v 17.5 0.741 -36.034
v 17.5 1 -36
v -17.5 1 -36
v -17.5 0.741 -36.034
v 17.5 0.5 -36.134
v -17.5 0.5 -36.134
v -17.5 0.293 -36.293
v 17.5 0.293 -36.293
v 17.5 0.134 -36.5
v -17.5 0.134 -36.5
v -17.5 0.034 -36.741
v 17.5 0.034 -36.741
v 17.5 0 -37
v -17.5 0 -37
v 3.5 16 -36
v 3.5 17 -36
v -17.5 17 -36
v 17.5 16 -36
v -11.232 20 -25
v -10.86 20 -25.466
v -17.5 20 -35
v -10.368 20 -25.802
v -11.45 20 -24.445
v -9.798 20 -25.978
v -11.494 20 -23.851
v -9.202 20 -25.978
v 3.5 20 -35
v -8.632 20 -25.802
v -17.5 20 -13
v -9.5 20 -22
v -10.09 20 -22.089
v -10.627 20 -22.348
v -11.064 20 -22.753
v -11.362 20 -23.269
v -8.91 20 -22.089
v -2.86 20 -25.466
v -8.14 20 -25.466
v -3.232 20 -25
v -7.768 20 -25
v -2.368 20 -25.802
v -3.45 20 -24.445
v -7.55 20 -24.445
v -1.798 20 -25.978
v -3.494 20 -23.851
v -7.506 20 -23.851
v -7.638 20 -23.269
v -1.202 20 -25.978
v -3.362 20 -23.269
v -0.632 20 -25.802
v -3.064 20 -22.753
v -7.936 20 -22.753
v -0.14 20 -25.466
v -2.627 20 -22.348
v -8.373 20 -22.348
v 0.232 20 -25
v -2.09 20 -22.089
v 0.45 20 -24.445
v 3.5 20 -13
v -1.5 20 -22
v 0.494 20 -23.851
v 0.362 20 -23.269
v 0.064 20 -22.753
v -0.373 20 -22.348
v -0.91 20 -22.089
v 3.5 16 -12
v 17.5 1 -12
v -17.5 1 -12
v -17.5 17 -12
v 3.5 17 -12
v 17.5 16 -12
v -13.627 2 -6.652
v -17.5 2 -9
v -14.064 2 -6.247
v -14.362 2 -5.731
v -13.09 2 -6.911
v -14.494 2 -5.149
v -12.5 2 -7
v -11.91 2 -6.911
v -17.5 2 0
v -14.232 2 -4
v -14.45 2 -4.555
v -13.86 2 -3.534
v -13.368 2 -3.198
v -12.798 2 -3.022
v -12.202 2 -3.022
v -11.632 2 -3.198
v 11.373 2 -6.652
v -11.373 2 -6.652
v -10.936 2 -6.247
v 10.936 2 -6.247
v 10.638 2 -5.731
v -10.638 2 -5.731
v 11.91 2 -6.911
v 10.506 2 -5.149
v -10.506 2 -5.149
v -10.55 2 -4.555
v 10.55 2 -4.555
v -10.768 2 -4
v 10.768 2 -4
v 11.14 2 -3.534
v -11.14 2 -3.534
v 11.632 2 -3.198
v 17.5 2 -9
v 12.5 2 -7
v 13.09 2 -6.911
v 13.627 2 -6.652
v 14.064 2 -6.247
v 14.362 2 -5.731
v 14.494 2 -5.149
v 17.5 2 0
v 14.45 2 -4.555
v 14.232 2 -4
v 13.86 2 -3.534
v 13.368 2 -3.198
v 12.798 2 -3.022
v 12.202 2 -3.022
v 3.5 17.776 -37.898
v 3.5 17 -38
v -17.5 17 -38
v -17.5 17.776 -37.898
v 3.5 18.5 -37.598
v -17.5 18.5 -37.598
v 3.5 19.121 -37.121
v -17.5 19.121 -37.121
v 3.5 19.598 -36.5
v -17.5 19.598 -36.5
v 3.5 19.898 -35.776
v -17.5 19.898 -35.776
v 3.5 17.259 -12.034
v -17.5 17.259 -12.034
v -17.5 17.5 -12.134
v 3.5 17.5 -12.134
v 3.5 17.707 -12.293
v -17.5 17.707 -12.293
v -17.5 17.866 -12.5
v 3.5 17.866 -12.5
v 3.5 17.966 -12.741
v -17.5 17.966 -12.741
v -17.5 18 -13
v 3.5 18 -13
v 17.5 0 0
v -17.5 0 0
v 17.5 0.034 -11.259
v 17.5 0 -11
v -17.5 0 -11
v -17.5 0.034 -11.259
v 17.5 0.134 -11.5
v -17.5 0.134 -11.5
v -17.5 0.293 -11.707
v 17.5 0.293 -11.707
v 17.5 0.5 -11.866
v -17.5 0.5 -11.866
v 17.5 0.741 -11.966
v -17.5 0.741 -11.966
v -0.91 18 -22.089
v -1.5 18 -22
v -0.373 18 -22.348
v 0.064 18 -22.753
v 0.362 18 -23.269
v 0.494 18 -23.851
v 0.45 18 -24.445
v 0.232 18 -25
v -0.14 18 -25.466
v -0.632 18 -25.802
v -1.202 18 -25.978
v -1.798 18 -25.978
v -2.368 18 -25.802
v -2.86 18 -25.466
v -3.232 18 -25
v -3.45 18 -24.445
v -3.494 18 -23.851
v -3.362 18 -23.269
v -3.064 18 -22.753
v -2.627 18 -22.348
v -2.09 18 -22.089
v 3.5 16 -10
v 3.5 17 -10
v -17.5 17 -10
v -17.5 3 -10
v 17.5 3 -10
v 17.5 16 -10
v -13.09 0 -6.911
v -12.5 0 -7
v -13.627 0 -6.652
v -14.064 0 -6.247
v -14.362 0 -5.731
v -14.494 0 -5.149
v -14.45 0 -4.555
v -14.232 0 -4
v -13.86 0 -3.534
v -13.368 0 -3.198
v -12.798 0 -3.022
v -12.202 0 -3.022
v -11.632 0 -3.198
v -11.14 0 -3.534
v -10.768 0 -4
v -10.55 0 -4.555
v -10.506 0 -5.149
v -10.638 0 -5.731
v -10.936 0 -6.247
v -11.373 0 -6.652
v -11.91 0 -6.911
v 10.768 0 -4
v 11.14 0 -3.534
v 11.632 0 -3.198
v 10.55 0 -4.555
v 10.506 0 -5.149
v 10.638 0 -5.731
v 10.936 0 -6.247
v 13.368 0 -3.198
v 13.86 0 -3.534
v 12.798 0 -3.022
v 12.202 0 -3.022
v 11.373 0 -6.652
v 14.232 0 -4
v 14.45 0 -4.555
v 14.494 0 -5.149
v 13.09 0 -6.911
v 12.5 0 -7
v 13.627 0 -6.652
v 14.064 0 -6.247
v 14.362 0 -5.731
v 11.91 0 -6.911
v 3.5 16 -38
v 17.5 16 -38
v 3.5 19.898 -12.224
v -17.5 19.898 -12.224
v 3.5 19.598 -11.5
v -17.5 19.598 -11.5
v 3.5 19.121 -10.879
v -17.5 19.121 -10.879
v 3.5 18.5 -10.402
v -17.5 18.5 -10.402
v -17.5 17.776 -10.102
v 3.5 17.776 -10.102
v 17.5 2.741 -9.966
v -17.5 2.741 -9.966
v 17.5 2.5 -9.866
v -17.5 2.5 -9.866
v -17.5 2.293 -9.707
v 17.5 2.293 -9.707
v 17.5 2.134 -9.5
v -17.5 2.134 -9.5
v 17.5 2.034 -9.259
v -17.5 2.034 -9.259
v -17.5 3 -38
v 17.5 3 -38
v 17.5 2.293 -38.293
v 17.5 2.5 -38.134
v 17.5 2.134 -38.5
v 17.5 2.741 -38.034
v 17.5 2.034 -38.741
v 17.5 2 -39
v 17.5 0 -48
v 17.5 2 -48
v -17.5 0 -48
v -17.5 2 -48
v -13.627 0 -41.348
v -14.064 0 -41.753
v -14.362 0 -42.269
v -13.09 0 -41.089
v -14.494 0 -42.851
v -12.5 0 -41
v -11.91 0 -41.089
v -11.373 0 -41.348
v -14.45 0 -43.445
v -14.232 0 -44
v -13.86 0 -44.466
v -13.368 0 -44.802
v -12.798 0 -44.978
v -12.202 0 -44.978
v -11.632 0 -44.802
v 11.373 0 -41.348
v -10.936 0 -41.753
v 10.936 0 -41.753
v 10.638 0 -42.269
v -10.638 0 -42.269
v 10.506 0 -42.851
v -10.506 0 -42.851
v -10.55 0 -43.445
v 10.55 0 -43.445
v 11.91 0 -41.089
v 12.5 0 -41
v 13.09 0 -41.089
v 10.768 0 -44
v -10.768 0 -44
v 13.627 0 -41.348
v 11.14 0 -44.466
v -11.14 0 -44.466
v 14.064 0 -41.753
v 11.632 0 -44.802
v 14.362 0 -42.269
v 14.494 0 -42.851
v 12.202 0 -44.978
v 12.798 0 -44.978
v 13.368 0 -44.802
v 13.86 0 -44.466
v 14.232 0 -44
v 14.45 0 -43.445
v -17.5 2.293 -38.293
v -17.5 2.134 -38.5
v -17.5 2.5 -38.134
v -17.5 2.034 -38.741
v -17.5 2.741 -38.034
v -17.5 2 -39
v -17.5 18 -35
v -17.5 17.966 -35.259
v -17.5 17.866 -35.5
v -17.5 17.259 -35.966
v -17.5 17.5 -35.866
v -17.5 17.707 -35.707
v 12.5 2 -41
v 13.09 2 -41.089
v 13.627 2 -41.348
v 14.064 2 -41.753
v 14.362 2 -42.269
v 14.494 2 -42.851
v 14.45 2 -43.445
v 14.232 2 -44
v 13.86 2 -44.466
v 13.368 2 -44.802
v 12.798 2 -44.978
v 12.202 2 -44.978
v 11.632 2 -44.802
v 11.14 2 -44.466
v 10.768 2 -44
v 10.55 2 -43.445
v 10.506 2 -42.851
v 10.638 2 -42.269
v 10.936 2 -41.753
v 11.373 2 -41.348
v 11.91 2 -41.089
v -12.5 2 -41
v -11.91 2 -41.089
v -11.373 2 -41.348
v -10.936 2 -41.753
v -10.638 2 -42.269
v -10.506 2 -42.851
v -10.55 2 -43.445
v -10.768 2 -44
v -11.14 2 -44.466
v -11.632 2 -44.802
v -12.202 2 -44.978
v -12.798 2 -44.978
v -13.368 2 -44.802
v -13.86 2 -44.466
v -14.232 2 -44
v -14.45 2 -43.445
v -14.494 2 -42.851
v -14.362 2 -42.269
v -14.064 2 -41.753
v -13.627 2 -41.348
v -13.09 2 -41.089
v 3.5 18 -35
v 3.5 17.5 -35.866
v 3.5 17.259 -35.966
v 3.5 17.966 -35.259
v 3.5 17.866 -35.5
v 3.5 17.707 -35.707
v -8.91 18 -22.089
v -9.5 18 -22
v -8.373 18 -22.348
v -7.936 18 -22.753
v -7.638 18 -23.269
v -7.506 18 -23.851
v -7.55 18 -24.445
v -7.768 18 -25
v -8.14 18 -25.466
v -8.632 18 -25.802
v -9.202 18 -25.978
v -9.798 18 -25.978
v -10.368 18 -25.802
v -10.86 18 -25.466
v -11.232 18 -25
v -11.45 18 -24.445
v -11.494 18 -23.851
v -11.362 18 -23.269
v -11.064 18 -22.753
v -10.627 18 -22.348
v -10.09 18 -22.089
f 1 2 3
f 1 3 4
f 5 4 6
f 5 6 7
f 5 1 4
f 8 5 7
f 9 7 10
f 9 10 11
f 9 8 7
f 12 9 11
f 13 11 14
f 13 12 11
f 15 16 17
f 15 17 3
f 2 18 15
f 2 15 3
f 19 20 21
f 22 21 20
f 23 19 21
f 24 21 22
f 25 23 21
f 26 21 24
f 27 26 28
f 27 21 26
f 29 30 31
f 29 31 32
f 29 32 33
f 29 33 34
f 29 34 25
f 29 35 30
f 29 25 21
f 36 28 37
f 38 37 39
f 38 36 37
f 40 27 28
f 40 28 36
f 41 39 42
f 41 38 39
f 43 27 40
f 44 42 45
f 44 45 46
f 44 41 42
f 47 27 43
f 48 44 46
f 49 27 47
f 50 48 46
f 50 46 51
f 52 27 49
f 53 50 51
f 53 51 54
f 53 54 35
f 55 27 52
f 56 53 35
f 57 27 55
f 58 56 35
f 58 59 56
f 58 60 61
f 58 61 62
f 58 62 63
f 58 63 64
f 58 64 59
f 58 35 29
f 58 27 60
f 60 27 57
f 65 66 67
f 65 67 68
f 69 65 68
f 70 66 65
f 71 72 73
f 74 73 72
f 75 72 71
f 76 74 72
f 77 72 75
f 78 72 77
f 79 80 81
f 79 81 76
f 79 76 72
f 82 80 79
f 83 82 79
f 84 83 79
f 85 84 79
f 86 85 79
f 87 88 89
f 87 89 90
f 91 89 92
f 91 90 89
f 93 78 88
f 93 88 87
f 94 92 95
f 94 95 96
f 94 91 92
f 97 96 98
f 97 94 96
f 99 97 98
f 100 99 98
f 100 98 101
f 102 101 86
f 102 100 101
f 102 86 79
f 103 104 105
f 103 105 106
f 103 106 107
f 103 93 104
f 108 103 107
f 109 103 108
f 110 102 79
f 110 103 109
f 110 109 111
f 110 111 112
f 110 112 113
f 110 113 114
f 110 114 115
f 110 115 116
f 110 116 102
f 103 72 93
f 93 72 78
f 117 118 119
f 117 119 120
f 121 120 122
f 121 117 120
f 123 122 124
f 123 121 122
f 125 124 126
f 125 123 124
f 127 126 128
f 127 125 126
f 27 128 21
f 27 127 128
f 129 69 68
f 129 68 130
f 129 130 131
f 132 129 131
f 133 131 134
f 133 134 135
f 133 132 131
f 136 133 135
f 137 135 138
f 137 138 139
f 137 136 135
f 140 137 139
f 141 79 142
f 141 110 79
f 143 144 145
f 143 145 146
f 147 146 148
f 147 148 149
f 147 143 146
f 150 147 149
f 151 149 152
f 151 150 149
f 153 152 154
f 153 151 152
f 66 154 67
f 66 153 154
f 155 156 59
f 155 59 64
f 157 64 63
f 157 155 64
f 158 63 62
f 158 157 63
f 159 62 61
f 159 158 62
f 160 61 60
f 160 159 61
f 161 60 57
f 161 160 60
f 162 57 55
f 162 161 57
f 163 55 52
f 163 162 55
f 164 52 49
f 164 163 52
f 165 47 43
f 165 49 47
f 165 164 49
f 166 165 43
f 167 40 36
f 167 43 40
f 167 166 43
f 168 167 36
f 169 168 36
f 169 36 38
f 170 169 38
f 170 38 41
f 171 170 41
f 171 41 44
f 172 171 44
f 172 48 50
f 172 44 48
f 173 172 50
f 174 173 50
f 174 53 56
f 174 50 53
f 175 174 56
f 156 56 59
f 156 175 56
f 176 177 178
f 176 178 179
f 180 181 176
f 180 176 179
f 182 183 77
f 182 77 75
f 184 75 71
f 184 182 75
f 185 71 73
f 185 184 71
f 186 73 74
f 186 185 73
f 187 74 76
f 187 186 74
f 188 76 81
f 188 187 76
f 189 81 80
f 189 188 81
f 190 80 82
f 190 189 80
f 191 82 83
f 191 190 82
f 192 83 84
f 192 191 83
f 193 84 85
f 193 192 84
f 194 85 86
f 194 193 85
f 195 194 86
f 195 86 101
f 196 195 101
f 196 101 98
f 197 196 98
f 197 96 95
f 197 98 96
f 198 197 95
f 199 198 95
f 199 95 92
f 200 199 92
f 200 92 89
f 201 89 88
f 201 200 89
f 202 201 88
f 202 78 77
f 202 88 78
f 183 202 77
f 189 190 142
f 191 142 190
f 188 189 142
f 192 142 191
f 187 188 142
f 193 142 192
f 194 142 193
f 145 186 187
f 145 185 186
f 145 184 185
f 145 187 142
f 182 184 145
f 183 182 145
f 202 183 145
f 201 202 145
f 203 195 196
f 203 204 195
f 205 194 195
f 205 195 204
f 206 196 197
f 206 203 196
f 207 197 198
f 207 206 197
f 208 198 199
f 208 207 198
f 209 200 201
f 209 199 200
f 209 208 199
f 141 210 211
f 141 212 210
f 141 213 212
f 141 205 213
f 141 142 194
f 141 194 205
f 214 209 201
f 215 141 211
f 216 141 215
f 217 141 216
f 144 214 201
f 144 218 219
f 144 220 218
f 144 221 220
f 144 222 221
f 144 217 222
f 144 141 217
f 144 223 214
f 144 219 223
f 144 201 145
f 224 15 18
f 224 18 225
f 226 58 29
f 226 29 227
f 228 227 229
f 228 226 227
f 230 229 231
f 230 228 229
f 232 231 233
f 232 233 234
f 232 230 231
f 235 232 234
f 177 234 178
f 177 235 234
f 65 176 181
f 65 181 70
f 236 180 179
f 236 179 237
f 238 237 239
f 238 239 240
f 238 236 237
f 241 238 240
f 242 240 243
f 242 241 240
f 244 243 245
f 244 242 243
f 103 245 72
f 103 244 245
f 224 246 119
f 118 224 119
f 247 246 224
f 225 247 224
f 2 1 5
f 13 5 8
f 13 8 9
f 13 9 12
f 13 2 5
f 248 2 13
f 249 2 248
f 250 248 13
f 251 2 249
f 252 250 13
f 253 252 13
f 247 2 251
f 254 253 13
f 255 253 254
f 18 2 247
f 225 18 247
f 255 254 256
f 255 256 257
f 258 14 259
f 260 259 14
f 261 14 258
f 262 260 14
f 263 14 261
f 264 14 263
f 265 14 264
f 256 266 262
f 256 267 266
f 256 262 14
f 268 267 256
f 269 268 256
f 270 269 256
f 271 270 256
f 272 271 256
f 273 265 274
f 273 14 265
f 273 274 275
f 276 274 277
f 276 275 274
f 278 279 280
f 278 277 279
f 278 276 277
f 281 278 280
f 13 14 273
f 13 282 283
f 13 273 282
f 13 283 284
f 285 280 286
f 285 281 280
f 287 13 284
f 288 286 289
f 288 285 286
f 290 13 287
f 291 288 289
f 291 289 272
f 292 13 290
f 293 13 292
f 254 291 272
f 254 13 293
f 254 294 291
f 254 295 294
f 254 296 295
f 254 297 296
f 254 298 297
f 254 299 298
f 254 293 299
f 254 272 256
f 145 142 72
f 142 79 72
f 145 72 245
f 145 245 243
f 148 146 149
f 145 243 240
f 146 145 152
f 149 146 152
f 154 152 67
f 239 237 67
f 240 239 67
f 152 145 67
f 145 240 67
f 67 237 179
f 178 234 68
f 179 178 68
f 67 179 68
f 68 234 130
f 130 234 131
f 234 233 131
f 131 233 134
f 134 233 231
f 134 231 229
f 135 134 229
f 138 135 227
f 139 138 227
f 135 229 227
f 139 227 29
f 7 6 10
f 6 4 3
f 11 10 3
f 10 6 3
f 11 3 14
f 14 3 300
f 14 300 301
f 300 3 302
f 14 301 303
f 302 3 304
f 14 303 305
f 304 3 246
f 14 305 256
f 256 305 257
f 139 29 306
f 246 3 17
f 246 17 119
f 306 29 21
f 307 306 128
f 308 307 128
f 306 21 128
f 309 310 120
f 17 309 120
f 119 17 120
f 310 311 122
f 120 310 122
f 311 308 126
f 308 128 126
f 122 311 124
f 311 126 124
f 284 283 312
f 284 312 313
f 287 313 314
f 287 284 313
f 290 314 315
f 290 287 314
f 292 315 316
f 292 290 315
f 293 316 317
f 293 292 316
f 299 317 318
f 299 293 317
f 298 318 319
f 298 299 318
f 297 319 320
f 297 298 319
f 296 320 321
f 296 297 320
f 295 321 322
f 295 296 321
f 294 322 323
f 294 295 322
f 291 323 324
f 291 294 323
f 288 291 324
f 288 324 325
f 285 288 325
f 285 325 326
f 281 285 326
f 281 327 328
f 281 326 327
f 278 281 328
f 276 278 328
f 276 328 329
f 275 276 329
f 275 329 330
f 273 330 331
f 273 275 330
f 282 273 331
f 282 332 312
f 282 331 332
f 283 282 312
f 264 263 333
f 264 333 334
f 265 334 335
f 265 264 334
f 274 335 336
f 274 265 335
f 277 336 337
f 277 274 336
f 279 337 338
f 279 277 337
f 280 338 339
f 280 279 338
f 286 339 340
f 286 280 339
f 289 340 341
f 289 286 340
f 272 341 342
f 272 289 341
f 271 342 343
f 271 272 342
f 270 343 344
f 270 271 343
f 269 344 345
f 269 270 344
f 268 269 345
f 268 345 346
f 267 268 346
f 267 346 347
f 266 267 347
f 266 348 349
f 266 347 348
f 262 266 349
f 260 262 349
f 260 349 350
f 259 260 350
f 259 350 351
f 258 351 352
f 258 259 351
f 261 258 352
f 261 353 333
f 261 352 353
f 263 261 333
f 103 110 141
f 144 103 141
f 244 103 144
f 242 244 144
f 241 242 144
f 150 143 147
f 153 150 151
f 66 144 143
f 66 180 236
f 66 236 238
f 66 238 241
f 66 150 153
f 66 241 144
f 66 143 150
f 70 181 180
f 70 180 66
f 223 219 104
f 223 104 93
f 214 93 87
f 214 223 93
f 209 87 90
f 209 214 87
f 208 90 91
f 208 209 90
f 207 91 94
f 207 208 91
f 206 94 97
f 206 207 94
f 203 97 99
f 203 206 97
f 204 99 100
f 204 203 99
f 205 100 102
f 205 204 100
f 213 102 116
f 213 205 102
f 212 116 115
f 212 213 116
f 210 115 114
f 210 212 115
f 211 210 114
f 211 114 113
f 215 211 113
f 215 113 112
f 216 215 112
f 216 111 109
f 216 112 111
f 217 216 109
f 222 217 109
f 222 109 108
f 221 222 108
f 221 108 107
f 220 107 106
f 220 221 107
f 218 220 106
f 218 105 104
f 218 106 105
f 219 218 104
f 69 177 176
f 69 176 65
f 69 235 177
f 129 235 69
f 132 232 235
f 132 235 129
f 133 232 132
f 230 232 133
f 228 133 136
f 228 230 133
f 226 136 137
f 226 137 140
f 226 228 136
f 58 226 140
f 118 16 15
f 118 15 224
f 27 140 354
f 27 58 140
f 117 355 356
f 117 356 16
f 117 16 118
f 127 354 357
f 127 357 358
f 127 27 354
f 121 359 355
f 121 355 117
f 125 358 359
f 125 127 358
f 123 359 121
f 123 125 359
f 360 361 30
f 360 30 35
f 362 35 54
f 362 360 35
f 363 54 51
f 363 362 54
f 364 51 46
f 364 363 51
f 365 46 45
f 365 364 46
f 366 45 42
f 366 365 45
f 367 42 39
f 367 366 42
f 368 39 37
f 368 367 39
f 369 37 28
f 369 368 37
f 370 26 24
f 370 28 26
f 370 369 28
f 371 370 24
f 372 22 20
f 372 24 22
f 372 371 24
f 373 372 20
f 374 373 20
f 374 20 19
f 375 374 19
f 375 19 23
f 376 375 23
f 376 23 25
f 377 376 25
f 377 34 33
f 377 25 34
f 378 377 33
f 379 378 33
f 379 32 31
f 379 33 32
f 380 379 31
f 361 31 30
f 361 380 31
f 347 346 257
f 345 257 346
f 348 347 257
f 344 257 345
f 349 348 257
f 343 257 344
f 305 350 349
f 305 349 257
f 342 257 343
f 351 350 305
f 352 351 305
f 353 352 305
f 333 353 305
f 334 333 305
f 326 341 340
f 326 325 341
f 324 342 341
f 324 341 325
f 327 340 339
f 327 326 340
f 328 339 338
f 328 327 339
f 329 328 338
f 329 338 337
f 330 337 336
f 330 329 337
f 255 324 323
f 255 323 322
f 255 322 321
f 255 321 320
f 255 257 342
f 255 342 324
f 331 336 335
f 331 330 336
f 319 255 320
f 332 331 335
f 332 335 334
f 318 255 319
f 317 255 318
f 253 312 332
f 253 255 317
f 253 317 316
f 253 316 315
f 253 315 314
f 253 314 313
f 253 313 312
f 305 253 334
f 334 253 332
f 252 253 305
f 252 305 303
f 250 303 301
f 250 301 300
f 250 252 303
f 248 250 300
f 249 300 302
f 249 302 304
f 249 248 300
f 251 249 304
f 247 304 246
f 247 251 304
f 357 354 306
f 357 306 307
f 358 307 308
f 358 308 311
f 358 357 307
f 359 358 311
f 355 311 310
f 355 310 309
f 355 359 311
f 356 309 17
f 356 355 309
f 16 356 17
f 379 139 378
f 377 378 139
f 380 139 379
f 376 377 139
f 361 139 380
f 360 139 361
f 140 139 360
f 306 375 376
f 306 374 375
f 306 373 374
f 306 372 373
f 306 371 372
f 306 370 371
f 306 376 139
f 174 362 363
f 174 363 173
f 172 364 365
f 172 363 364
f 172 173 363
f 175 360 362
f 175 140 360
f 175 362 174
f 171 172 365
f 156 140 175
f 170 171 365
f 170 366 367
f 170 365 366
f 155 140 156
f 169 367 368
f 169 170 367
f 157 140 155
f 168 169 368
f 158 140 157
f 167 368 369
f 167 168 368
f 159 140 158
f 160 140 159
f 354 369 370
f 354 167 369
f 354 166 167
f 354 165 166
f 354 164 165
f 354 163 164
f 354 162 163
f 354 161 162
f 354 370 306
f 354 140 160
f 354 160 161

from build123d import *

# Parameters (mm, degrees)
BOSS_EXTRUDE1_DEPTH     = 17.5
CUT_EXTRUDE2_DEPTH      = 63.681735777
CUT_EXTRUDE2_DEPTH_BACK = 14
CUT_EXTRUDE3_DEPTH      = 55.16871791
CUT_EXTRUDE3_DEPTH_BACK = 55.16871791
SKETCH4_R               = 2
CUT_EXTRUDE5_DEPTH      = 55.16871791
CUT_EXTRUDE5_DEPTH_BACK = 55.16871791
SKETCH6_R               = 2


with BuildPart() as part:
    # Sketch1 → Boss-Extrude1 (new, symmetric)
    with BuildSketch(Plane(origin=(0, 0, 0), x_dir=(0, 0, -1), z_dir=(1, 0, 0))):
        with BuildLine():
            Line((0, 0), (11, 0))
            ThreePointArc((11, 0), (11.707106781, 0.292893219), (12, 1))
            Line((12, 1), (12, 17))
            ThreePointArc((12, 17), (12.292893219, 17.707106781), (13, 18))
            Line((13, 18), (35, 18))
            ThreePointArc((35, 18), (35.707106781, 17.707106781), (36, 17))
            Line((36, 17), (36, 1))
            ThreePointArc((36, 1), (36.292893219, 0.292893219), (37, 0))
            Line((37, 0), (48, 0))
            Line((48, 0), (48, 2))
            Line((48, 2), (39, 2))
            ThreePointArc((39, 2), (38.292893219, 2.292893219), (38, 3))
            Line((38, 3), (38, 17))
            ThreePointArc((38, 17), (37.121320344, 19.121320344), (35, 20))
            Line((35, 20), (13, 20))
            ThreePointArc((13, 20), (10.878679656, 19.121320344), (10, 17))
            Line((10, 17), (10, 3))
            ThreePointArc((10, 3), (9.707106781, 2.292893219), (9, 2))
            Line((9, 2), (0, 2))
            Line((0, 2), (0, 0))
        make_face()
    extrude(amount=BOSS_EXTRUDE1_DEPTH, both=True)

    # Sketch3 → Cut-Extrude2 (cut, two sides: drawn at the far end of the back side and taken through both)
    with BuildSketch(Plane(origin=(17.5, 0, 0), x_dir=(0, 0, -1), z_dir=(1, 0, 0)).offset(-CUT_EXTRUDE2_DEPTH_BACK)):
        with BuildLine():
            Line((10, 17), (10, 16))
            Line((10, 16), (12, 16))
            Line((12, 16), (12, 17))
            ThreePointArc((12, 17), (12.292893219, 17.707106781), (13, 18))
            Line((13, 18), (35, 18))
            ThreePointArc((35, 18), (35.707106781, 17.707106781), (36, 17))
            Line((36, 17), (36, 16))
            Line((36, 16), (38, 16))
            Line((38, 16), (38, 17))
            ThreePointArc((38, 17), (37.121320344, 19.121320344), (35, 20))
            Line((35, 20), (13, 20))
            ThreePointArc((13, 20), (10.878679656, 19.121320344), (10, 17))
        make_face()
    extrude(amount=CUT_EXTRUDE2_DEPTH + CUT_EXTRUDE2_DEPTH_BACK, mode=Mode.SUBTRACT)

    # Sketch4 → Cut-Extrude3 (cut, two sides: drawn at the far end of the back side and taken through both)
    with BuildSketch(Plane(origin=(0, 2, 0), x_dir=(1, 0, 0), z_dir=(0, 1, 0)).offset(-CUT_EXTRUDE3_DEPTH_BACK)):
        with Locations(Location((-12.5, 43, 0), (0, 0, 270))):
            Circle(SKETCH4_R)
        with Locations(Location((12.5, 43, 0), (0, 0, 270))):
            Circle(SKETCH4_R)
    extrude(amount=CUT_EXTRUDE3_DEPTH + CUT_EXTRUDE3_DEPTH_BACK, mode=Mode.SUBTRACT)

    # Sketch6 → Cut-Extrude5 (cut, two sides: drawn at the far end of the back side and taken through both)
    with BuildSketch(Plane(origin=(0, 2, 0), x_dir=(1, 0, 0), z_dir=(0, 1, 0)).offset(-CUT_EXTRUDE5_DEPTH_BACK)):
        with Locations(Location((-12.5, 5, 0), (0, 0, 90))):
            Circle(SKETCH6_R)
        with Locations(Location((12.5, 5, 0), (0, 0, 90))):
            Circle(SKETCH6_R)
        with Locations(Location((-9.5, 24, 0), (0, 0, 270))):
            Circle(SKETCH6_R)
        with Locations(Location((-1.5, 24, 0), (0, 0, 270))):
            Circle(SKETCH6_R)
    extrude(amount=CUT_EXTRUDE5_DEPTH + CUT_EXTRUDE5_DEPTH_BACK, mode=Mode.SUBTRACT)


solid = part.part
